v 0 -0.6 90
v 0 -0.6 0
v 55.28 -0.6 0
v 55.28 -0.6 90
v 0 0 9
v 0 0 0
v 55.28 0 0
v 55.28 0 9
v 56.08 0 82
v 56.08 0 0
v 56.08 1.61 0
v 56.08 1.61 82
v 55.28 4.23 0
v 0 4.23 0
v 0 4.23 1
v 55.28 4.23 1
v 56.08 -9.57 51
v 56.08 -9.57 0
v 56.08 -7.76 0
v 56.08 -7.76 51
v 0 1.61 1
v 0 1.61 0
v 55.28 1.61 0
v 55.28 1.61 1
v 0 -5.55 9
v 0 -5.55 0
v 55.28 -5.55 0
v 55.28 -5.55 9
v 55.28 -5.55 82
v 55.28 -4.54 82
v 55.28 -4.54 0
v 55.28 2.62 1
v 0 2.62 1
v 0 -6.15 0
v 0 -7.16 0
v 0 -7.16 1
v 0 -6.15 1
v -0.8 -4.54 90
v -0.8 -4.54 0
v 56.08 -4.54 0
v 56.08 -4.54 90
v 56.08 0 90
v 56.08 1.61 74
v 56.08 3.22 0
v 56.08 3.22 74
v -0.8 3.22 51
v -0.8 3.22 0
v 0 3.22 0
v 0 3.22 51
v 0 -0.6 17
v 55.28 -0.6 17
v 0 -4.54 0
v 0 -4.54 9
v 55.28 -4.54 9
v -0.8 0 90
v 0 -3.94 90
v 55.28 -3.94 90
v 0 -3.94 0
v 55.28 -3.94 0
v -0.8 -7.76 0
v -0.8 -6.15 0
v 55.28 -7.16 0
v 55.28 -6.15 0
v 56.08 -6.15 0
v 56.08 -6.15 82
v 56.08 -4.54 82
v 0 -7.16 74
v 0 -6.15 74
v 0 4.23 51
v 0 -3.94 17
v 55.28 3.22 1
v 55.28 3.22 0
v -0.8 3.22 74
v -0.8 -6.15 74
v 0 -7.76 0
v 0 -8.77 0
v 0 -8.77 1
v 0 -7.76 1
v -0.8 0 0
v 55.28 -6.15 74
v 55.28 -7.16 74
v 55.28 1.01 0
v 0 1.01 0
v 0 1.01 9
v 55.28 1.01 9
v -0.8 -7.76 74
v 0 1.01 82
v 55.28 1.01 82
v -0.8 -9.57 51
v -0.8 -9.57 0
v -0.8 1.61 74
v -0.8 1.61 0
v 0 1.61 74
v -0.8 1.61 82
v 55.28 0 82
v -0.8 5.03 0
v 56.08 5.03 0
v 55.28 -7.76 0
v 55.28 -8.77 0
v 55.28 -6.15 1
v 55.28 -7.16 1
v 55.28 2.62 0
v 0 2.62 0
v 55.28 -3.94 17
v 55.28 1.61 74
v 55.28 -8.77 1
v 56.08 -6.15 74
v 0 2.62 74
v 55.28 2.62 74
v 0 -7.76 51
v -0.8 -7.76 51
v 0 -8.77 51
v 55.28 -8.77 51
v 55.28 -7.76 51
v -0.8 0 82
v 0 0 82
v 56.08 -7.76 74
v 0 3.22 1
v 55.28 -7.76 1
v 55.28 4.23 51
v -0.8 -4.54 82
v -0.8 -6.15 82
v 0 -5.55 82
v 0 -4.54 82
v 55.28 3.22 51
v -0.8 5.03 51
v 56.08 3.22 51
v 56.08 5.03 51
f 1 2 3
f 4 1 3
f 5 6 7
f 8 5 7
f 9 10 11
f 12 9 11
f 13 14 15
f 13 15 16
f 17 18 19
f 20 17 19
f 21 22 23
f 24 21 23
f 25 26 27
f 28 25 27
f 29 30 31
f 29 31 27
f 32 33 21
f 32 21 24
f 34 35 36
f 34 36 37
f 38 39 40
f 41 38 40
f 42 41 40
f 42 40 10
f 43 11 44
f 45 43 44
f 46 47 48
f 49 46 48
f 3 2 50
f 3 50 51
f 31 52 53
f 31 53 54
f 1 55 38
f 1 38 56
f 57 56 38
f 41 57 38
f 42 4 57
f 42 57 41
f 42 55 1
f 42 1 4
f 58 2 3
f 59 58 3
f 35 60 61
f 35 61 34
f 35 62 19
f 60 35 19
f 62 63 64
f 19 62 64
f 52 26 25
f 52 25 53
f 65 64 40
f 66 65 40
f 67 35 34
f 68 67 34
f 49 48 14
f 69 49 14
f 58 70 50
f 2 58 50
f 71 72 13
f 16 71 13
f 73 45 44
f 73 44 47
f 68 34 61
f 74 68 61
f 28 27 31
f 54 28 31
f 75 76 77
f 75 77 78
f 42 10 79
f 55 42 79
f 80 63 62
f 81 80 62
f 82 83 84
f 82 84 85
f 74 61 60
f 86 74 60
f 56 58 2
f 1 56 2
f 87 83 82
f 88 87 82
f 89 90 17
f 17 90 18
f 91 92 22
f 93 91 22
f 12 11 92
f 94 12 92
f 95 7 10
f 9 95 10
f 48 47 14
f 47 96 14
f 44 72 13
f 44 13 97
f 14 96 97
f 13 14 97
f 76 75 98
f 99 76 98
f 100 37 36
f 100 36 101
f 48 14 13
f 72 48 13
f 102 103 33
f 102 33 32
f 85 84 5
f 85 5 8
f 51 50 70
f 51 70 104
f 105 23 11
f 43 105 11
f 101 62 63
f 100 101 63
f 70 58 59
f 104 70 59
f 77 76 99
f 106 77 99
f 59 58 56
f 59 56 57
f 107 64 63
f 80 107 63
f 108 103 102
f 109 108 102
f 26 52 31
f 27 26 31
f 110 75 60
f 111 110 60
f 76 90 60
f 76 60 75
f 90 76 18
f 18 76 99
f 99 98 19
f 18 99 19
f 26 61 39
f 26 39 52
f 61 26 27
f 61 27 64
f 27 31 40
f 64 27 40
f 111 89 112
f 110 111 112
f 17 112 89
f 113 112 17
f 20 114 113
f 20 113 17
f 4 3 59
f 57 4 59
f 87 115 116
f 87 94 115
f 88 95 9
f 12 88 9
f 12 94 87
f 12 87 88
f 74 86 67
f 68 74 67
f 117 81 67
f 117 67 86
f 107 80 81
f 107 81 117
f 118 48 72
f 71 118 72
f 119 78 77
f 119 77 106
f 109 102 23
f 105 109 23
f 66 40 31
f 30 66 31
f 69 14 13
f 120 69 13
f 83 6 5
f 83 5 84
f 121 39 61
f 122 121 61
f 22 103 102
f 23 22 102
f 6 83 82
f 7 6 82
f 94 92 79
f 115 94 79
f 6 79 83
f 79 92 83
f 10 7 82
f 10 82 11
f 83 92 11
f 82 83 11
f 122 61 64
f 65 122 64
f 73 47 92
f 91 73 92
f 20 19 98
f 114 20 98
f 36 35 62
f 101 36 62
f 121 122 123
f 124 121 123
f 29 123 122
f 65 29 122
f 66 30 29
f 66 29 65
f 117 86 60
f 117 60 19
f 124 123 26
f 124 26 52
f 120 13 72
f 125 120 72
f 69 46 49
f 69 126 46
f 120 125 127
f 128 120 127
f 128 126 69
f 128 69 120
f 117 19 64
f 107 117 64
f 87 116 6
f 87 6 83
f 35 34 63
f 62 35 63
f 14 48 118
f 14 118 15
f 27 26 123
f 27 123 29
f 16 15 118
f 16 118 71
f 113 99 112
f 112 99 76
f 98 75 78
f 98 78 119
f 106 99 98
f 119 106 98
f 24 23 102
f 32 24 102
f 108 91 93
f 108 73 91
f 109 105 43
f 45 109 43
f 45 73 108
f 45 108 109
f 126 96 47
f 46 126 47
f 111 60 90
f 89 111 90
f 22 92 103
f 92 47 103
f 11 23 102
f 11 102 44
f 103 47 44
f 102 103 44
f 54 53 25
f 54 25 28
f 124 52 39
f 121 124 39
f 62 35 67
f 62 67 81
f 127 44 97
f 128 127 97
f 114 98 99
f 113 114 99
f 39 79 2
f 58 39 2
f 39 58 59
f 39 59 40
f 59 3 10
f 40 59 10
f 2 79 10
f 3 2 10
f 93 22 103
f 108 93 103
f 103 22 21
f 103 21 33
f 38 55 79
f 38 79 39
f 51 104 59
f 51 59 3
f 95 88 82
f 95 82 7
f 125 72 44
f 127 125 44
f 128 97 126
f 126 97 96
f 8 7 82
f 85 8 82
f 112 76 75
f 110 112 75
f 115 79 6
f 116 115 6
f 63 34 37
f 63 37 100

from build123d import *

# Parameters (mm, degrees)
F0_W     = 55.28
F0_H     = 1.01
F1_DEPTH = 1
F2_DEPTH = 9
F0_H_2   = 3.34
F3_DEPTH = 17
F4_DEPTH = 51
F0_H_3   = 0.6
F5_DEPTH = 74
F6_DEPTH = 82
F7_DEPTH = 90


with BuildPart() as f1:
    # F0 (on Top) → F1 (new body)
    with BuildSketch(Plane.XY):
        with Locations((27.64, 3.725)):
            Rectangle(F0_W, F0_H)
        with Locations((27.64, 2.115)):
            Rectangle(F0_W, F0_H)
        with Locations((27.64, -6.655)):
            Rectangle(F0_W, F0_H)
        with Locations((27.64, -8.265)):
            Rectangle(F0_W, F0_H)
    extrude(amount=F1_DEPTH)


with BuildPart() as f2:
    # F0 (on Top) → F2 (new body)
    with BuildSketch(Plane.XY):
        with Locations((27.64, 0.505)):
            Rectangle(F0_W, F0_H)
        with Locations((27.64, -5.045)):
            Rectangle(F0_W, F0_H)
    extrude(amount=F2_DEPTH)


with BuildPart() as f3:
    # F0 (on Top) → F3 (new body)
    with BuildSketch(Plane.XY):
        with Locations((27.64, -2.27)):
            Rectangle(F0_W, F0_H_2)
    extrude(amount=F3_DEPTH)


with BuildPart() as f4:
    # F0 (on Top) → F4 (new body)
    with BuildSketch(Plane.XY):
        Polygon((-0.8, 3.22), (0, 3.22), (0, 4.23), (55.28, 4.23), (55.28, 3.22), (56.08, 3.22), (56.08, 5.03), (-0.8, 5.03), align=None)
        Polygon((56.08, -9.57), (56.08, -7.76), (55.28, -7.76), (55.28, -8.77), (0, -8.77), (0, -7.76), (-0.8, -7.76), (-0.8, -9.57), align=None)
    extrude(amount=F4_DEPTH)


with BuildPart() as f5:
    # F0 (on Top) → F5 (new body)
    with BuildSketch(Plane.XY):
        Polygon((-0.8, 1.61), (0, 1.61), (0, 2.62), (0, 3.22), (-0.8, 3.22), (-0.8, 2.72), align=None)
        with Locations((27.64, 2.92)):
            Rectangle(F0_W, F0_H_3)
        Polygon((55.28, 2.62), (55.28, 1.61), (56.08, 1.61), (56.08, 2.483085), (56.08, 3.22), (55.28, 3.22), align=None)
        Polygon((56.08, -7.011401), (56.08, -6.15), (55.28, -6.15), (55.28, -7.16), (55.28, -7.76), (56.08, -7.76), align=None)
        with Locations((27.64, -7.46)):
            Rectangle(F0_W, F0_H_3)
        Polygon((0, -7.16), (0, -6.15), (-0.8, -6.15), (-0.8, -7.36), (-0.8, -7.76), (0, -7.76), align=None)
    extrude(amount=F5_DEPTH)


with BuildPart() as f6:
    # F0 (on Top) → F6 (new body)
    with BuildSketch(Plane.XY):
        Polygon((-0.8, 0), (0, 0), (0, 1.01), (0, 1.61), (-0.8, 1.61), (-0.8, 1.06), align=None)
        with Locations((27.64, 1.31)):
            Rectangle(F0_W, F0_H_3)
        Polygon((55.28, 1.01), (55.28, 0), (56.08, 0), (56.08, 1.61), (55.28, 1.61), align=None)
        Polygon((56.08, -4.54), (55.28, -4.54), (55.28, -5.55), (55.28, -6.15), (56.08, -6.15), align=None)
        with Locations((27.64, -5.85)):
            Rectangle(F0_W, F0_H_3)
        Polygon((0, -5.55), (0, -4.54), (-0.8, -4.54), (-0.8, -5.7), (-0.8, -6.15), (0, -6.15), align=None)
    extrude(amount=F6_DEPTH)


with BuildPart() as f7:
    # F0 (on Top) → F7 (new body)
    with BuildSketch(Plane.XY):
        Polygon((0, -0.6), (0, 0), (-0.8, 0), (-0.8, -0.6), (-0.8, -4.04), (-0.8, -4.54), (0, -4.54), (0, -3.94), align=None)
        with Locations((27.64, -0.3)):
            Rectangle(F0_W, F0_H_3)
        Polygon((56.08, 0), (55.28, 0), (55.28, -0.6), (55.28, -3.94), (55.28, -4.54), (56.08, -4.54), (56.08, -3.855519), align=None)
        with Locations((27.64, -4.24)):
            Rectangle(F0_W, F0_H_3)
    extrude(amount=F7_DEPTH)


solid = Compound([f1.part, f2.part, f3.part, f4.part, f5.part, f6.part, f7.part])
